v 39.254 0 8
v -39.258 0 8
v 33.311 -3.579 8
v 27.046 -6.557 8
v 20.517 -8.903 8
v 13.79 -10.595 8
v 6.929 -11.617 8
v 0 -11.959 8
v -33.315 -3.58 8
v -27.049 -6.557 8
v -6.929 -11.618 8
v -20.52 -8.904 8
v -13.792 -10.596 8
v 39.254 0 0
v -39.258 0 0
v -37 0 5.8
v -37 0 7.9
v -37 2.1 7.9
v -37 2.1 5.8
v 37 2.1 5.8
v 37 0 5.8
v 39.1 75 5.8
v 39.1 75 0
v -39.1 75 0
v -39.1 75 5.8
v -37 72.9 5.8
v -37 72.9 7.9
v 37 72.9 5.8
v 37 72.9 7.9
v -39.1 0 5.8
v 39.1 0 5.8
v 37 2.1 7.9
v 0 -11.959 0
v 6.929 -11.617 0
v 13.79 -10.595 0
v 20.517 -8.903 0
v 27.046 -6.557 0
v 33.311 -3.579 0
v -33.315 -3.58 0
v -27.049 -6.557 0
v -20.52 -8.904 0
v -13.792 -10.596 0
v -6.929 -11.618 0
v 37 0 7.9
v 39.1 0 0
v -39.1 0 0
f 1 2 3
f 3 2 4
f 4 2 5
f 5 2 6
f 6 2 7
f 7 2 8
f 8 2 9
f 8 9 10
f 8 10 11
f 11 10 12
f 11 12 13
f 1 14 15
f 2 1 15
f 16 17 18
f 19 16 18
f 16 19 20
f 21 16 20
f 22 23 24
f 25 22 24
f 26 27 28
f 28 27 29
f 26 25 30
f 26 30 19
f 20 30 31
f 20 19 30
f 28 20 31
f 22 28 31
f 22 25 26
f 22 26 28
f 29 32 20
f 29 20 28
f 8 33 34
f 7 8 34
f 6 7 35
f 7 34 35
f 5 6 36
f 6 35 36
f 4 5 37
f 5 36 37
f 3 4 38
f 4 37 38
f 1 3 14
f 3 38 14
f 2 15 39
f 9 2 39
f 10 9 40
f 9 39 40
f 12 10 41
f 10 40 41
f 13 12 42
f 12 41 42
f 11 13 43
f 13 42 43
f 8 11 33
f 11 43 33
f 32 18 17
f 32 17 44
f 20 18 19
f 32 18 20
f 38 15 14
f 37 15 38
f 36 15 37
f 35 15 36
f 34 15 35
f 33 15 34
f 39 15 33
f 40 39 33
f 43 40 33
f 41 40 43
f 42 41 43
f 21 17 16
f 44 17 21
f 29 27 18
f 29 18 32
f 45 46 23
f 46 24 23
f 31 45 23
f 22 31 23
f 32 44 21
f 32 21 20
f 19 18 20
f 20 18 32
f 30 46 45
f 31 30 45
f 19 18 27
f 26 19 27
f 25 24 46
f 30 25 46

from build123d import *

# Parameters (mm, degrees)
F1_DEPTH = 7.9
F2_W     = 78.2
F2_H     = 75
F2_W_2   = 74
F2_H_2   = 70.8
F3_DEPTH = 2.1
F4_W     = 74
F4_H     = 2.1
F5_DEPTH = 2.1
F7_DEPTH = 8


with BuildPart() as f1:
    # F0 (on Top) → F1 (new body)
    with BuildSketch(Plane.XY):
        Polygon((-39.1, 0), (0, 0), (39.1, 0), (39.1, 75), (0, 75), (-39.1, 75), align=None)
    extrude(amount=F1_DEPTH)

    # F2 (on face) → F3 (cut)
    with BuildSketch(Plane.XY.offset(7.9)):
        with Locations((0, 37.5)):
            Rectangle(F2_W, F2_H)
        with Locations((0, 37.5)):
            Rectangle(F2_W_2, F2_H_2, mode=Mode.SUBTRACT)
    extrude(amount=-F3_DEPTH, mode=Mode.SUBTRACT)


with BuildPart() as f5:
    # F4 (on face) → F5 (new body)
    with BuildSketch(Plane.XY.offset(7.9)):
        with Locations((0, 1.05)):
            Rectangle(F4_W, F4_H)
    extrude(amount=-F5_DEPTH)


with BuildPart() as f7:
    # F6 (on Top) → F7 (new body)
    with BuildSketch(Plane.XY):
        with BuildLine():
            Line((39.253592, 0), (0, 0))
            Line((0, 0), (0, -11.95946))
            ThreePointArc((0, -11.95946), (20.517408, -8.902913), (39.253592, 0))
        make_face()
        with BuildLine():
            Line((0, -11.95946), (0, 0))
            Line((0, 0), (-39.258406, 0))
            ThreePointArc((-39.258406, 0), (-20.519919, -8.903615), (0, -11.95946))
        make_face()
    extrude(amount=F7_DEPTH)


solid = Compound([f1.part, f5.part, f7.part])
